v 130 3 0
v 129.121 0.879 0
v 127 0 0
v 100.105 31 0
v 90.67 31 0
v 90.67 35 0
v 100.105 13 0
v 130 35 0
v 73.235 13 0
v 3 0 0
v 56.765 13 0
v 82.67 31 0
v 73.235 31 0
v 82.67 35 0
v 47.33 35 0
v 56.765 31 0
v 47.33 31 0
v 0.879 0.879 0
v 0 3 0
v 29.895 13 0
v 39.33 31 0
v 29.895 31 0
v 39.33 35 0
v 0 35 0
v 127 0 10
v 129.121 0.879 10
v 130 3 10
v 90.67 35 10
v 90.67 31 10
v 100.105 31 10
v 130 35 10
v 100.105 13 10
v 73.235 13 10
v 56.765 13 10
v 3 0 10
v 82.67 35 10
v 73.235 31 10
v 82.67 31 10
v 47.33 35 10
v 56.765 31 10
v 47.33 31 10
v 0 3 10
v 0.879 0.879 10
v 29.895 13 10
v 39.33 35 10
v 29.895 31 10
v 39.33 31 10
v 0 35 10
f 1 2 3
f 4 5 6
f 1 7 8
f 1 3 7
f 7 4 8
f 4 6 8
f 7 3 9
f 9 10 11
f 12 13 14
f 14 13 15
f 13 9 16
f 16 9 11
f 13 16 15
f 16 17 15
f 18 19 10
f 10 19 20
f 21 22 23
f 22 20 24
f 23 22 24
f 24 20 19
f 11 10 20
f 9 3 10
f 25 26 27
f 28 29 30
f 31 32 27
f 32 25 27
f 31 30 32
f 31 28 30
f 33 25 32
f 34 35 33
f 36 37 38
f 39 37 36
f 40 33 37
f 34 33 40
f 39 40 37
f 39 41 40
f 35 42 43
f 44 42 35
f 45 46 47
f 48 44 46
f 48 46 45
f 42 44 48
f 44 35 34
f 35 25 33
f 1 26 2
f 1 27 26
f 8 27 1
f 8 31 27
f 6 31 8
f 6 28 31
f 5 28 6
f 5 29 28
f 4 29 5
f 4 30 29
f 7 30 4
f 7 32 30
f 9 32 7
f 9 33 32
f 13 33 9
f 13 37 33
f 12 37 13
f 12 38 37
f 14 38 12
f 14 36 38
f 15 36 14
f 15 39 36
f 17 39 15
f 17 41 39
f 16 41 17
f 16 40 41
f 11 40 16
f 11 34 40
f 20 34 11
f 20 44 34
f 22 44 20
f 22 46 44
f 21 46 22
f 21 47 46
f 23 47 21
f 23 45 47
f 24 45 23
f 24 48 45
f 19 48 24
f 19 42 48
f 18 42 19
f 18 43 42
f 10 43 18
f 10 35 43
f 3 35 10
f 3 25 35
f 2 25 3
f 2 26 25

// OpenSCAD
$fn = 32;

// ----------------------------------------------------------------------
// Window plate: 130 x 35 mm, 2 open windows
// ----------------------------------------------------------------------

// --- parameters (mm) ---
profile_height = 10;      // extrusion height
profile_points = 24;      // points of the closed outline

profile = [[0, 3], [0.879, 0.879], [3, 0], [127, 0], [129.121, 0.879], [130, 3], [130, 35], [90.67, 35], [90.67, 31], [100.105, 31], [100.105, 13], [73.235, 13], [73.235, 31], [82.67, 31], [82.67, 35], [47.33, 35], [47.33, 31], [56.765, 31], [56.765, 13], [29.895, 13], [29.895, 31], [39.33, 31], [39.33, 35], [0, 35]];  // single closed polygon, 24 points, counter clockwise

// --- the one profile operation ---
linear_extrude(height = profile_height) polygon(points = profile);
